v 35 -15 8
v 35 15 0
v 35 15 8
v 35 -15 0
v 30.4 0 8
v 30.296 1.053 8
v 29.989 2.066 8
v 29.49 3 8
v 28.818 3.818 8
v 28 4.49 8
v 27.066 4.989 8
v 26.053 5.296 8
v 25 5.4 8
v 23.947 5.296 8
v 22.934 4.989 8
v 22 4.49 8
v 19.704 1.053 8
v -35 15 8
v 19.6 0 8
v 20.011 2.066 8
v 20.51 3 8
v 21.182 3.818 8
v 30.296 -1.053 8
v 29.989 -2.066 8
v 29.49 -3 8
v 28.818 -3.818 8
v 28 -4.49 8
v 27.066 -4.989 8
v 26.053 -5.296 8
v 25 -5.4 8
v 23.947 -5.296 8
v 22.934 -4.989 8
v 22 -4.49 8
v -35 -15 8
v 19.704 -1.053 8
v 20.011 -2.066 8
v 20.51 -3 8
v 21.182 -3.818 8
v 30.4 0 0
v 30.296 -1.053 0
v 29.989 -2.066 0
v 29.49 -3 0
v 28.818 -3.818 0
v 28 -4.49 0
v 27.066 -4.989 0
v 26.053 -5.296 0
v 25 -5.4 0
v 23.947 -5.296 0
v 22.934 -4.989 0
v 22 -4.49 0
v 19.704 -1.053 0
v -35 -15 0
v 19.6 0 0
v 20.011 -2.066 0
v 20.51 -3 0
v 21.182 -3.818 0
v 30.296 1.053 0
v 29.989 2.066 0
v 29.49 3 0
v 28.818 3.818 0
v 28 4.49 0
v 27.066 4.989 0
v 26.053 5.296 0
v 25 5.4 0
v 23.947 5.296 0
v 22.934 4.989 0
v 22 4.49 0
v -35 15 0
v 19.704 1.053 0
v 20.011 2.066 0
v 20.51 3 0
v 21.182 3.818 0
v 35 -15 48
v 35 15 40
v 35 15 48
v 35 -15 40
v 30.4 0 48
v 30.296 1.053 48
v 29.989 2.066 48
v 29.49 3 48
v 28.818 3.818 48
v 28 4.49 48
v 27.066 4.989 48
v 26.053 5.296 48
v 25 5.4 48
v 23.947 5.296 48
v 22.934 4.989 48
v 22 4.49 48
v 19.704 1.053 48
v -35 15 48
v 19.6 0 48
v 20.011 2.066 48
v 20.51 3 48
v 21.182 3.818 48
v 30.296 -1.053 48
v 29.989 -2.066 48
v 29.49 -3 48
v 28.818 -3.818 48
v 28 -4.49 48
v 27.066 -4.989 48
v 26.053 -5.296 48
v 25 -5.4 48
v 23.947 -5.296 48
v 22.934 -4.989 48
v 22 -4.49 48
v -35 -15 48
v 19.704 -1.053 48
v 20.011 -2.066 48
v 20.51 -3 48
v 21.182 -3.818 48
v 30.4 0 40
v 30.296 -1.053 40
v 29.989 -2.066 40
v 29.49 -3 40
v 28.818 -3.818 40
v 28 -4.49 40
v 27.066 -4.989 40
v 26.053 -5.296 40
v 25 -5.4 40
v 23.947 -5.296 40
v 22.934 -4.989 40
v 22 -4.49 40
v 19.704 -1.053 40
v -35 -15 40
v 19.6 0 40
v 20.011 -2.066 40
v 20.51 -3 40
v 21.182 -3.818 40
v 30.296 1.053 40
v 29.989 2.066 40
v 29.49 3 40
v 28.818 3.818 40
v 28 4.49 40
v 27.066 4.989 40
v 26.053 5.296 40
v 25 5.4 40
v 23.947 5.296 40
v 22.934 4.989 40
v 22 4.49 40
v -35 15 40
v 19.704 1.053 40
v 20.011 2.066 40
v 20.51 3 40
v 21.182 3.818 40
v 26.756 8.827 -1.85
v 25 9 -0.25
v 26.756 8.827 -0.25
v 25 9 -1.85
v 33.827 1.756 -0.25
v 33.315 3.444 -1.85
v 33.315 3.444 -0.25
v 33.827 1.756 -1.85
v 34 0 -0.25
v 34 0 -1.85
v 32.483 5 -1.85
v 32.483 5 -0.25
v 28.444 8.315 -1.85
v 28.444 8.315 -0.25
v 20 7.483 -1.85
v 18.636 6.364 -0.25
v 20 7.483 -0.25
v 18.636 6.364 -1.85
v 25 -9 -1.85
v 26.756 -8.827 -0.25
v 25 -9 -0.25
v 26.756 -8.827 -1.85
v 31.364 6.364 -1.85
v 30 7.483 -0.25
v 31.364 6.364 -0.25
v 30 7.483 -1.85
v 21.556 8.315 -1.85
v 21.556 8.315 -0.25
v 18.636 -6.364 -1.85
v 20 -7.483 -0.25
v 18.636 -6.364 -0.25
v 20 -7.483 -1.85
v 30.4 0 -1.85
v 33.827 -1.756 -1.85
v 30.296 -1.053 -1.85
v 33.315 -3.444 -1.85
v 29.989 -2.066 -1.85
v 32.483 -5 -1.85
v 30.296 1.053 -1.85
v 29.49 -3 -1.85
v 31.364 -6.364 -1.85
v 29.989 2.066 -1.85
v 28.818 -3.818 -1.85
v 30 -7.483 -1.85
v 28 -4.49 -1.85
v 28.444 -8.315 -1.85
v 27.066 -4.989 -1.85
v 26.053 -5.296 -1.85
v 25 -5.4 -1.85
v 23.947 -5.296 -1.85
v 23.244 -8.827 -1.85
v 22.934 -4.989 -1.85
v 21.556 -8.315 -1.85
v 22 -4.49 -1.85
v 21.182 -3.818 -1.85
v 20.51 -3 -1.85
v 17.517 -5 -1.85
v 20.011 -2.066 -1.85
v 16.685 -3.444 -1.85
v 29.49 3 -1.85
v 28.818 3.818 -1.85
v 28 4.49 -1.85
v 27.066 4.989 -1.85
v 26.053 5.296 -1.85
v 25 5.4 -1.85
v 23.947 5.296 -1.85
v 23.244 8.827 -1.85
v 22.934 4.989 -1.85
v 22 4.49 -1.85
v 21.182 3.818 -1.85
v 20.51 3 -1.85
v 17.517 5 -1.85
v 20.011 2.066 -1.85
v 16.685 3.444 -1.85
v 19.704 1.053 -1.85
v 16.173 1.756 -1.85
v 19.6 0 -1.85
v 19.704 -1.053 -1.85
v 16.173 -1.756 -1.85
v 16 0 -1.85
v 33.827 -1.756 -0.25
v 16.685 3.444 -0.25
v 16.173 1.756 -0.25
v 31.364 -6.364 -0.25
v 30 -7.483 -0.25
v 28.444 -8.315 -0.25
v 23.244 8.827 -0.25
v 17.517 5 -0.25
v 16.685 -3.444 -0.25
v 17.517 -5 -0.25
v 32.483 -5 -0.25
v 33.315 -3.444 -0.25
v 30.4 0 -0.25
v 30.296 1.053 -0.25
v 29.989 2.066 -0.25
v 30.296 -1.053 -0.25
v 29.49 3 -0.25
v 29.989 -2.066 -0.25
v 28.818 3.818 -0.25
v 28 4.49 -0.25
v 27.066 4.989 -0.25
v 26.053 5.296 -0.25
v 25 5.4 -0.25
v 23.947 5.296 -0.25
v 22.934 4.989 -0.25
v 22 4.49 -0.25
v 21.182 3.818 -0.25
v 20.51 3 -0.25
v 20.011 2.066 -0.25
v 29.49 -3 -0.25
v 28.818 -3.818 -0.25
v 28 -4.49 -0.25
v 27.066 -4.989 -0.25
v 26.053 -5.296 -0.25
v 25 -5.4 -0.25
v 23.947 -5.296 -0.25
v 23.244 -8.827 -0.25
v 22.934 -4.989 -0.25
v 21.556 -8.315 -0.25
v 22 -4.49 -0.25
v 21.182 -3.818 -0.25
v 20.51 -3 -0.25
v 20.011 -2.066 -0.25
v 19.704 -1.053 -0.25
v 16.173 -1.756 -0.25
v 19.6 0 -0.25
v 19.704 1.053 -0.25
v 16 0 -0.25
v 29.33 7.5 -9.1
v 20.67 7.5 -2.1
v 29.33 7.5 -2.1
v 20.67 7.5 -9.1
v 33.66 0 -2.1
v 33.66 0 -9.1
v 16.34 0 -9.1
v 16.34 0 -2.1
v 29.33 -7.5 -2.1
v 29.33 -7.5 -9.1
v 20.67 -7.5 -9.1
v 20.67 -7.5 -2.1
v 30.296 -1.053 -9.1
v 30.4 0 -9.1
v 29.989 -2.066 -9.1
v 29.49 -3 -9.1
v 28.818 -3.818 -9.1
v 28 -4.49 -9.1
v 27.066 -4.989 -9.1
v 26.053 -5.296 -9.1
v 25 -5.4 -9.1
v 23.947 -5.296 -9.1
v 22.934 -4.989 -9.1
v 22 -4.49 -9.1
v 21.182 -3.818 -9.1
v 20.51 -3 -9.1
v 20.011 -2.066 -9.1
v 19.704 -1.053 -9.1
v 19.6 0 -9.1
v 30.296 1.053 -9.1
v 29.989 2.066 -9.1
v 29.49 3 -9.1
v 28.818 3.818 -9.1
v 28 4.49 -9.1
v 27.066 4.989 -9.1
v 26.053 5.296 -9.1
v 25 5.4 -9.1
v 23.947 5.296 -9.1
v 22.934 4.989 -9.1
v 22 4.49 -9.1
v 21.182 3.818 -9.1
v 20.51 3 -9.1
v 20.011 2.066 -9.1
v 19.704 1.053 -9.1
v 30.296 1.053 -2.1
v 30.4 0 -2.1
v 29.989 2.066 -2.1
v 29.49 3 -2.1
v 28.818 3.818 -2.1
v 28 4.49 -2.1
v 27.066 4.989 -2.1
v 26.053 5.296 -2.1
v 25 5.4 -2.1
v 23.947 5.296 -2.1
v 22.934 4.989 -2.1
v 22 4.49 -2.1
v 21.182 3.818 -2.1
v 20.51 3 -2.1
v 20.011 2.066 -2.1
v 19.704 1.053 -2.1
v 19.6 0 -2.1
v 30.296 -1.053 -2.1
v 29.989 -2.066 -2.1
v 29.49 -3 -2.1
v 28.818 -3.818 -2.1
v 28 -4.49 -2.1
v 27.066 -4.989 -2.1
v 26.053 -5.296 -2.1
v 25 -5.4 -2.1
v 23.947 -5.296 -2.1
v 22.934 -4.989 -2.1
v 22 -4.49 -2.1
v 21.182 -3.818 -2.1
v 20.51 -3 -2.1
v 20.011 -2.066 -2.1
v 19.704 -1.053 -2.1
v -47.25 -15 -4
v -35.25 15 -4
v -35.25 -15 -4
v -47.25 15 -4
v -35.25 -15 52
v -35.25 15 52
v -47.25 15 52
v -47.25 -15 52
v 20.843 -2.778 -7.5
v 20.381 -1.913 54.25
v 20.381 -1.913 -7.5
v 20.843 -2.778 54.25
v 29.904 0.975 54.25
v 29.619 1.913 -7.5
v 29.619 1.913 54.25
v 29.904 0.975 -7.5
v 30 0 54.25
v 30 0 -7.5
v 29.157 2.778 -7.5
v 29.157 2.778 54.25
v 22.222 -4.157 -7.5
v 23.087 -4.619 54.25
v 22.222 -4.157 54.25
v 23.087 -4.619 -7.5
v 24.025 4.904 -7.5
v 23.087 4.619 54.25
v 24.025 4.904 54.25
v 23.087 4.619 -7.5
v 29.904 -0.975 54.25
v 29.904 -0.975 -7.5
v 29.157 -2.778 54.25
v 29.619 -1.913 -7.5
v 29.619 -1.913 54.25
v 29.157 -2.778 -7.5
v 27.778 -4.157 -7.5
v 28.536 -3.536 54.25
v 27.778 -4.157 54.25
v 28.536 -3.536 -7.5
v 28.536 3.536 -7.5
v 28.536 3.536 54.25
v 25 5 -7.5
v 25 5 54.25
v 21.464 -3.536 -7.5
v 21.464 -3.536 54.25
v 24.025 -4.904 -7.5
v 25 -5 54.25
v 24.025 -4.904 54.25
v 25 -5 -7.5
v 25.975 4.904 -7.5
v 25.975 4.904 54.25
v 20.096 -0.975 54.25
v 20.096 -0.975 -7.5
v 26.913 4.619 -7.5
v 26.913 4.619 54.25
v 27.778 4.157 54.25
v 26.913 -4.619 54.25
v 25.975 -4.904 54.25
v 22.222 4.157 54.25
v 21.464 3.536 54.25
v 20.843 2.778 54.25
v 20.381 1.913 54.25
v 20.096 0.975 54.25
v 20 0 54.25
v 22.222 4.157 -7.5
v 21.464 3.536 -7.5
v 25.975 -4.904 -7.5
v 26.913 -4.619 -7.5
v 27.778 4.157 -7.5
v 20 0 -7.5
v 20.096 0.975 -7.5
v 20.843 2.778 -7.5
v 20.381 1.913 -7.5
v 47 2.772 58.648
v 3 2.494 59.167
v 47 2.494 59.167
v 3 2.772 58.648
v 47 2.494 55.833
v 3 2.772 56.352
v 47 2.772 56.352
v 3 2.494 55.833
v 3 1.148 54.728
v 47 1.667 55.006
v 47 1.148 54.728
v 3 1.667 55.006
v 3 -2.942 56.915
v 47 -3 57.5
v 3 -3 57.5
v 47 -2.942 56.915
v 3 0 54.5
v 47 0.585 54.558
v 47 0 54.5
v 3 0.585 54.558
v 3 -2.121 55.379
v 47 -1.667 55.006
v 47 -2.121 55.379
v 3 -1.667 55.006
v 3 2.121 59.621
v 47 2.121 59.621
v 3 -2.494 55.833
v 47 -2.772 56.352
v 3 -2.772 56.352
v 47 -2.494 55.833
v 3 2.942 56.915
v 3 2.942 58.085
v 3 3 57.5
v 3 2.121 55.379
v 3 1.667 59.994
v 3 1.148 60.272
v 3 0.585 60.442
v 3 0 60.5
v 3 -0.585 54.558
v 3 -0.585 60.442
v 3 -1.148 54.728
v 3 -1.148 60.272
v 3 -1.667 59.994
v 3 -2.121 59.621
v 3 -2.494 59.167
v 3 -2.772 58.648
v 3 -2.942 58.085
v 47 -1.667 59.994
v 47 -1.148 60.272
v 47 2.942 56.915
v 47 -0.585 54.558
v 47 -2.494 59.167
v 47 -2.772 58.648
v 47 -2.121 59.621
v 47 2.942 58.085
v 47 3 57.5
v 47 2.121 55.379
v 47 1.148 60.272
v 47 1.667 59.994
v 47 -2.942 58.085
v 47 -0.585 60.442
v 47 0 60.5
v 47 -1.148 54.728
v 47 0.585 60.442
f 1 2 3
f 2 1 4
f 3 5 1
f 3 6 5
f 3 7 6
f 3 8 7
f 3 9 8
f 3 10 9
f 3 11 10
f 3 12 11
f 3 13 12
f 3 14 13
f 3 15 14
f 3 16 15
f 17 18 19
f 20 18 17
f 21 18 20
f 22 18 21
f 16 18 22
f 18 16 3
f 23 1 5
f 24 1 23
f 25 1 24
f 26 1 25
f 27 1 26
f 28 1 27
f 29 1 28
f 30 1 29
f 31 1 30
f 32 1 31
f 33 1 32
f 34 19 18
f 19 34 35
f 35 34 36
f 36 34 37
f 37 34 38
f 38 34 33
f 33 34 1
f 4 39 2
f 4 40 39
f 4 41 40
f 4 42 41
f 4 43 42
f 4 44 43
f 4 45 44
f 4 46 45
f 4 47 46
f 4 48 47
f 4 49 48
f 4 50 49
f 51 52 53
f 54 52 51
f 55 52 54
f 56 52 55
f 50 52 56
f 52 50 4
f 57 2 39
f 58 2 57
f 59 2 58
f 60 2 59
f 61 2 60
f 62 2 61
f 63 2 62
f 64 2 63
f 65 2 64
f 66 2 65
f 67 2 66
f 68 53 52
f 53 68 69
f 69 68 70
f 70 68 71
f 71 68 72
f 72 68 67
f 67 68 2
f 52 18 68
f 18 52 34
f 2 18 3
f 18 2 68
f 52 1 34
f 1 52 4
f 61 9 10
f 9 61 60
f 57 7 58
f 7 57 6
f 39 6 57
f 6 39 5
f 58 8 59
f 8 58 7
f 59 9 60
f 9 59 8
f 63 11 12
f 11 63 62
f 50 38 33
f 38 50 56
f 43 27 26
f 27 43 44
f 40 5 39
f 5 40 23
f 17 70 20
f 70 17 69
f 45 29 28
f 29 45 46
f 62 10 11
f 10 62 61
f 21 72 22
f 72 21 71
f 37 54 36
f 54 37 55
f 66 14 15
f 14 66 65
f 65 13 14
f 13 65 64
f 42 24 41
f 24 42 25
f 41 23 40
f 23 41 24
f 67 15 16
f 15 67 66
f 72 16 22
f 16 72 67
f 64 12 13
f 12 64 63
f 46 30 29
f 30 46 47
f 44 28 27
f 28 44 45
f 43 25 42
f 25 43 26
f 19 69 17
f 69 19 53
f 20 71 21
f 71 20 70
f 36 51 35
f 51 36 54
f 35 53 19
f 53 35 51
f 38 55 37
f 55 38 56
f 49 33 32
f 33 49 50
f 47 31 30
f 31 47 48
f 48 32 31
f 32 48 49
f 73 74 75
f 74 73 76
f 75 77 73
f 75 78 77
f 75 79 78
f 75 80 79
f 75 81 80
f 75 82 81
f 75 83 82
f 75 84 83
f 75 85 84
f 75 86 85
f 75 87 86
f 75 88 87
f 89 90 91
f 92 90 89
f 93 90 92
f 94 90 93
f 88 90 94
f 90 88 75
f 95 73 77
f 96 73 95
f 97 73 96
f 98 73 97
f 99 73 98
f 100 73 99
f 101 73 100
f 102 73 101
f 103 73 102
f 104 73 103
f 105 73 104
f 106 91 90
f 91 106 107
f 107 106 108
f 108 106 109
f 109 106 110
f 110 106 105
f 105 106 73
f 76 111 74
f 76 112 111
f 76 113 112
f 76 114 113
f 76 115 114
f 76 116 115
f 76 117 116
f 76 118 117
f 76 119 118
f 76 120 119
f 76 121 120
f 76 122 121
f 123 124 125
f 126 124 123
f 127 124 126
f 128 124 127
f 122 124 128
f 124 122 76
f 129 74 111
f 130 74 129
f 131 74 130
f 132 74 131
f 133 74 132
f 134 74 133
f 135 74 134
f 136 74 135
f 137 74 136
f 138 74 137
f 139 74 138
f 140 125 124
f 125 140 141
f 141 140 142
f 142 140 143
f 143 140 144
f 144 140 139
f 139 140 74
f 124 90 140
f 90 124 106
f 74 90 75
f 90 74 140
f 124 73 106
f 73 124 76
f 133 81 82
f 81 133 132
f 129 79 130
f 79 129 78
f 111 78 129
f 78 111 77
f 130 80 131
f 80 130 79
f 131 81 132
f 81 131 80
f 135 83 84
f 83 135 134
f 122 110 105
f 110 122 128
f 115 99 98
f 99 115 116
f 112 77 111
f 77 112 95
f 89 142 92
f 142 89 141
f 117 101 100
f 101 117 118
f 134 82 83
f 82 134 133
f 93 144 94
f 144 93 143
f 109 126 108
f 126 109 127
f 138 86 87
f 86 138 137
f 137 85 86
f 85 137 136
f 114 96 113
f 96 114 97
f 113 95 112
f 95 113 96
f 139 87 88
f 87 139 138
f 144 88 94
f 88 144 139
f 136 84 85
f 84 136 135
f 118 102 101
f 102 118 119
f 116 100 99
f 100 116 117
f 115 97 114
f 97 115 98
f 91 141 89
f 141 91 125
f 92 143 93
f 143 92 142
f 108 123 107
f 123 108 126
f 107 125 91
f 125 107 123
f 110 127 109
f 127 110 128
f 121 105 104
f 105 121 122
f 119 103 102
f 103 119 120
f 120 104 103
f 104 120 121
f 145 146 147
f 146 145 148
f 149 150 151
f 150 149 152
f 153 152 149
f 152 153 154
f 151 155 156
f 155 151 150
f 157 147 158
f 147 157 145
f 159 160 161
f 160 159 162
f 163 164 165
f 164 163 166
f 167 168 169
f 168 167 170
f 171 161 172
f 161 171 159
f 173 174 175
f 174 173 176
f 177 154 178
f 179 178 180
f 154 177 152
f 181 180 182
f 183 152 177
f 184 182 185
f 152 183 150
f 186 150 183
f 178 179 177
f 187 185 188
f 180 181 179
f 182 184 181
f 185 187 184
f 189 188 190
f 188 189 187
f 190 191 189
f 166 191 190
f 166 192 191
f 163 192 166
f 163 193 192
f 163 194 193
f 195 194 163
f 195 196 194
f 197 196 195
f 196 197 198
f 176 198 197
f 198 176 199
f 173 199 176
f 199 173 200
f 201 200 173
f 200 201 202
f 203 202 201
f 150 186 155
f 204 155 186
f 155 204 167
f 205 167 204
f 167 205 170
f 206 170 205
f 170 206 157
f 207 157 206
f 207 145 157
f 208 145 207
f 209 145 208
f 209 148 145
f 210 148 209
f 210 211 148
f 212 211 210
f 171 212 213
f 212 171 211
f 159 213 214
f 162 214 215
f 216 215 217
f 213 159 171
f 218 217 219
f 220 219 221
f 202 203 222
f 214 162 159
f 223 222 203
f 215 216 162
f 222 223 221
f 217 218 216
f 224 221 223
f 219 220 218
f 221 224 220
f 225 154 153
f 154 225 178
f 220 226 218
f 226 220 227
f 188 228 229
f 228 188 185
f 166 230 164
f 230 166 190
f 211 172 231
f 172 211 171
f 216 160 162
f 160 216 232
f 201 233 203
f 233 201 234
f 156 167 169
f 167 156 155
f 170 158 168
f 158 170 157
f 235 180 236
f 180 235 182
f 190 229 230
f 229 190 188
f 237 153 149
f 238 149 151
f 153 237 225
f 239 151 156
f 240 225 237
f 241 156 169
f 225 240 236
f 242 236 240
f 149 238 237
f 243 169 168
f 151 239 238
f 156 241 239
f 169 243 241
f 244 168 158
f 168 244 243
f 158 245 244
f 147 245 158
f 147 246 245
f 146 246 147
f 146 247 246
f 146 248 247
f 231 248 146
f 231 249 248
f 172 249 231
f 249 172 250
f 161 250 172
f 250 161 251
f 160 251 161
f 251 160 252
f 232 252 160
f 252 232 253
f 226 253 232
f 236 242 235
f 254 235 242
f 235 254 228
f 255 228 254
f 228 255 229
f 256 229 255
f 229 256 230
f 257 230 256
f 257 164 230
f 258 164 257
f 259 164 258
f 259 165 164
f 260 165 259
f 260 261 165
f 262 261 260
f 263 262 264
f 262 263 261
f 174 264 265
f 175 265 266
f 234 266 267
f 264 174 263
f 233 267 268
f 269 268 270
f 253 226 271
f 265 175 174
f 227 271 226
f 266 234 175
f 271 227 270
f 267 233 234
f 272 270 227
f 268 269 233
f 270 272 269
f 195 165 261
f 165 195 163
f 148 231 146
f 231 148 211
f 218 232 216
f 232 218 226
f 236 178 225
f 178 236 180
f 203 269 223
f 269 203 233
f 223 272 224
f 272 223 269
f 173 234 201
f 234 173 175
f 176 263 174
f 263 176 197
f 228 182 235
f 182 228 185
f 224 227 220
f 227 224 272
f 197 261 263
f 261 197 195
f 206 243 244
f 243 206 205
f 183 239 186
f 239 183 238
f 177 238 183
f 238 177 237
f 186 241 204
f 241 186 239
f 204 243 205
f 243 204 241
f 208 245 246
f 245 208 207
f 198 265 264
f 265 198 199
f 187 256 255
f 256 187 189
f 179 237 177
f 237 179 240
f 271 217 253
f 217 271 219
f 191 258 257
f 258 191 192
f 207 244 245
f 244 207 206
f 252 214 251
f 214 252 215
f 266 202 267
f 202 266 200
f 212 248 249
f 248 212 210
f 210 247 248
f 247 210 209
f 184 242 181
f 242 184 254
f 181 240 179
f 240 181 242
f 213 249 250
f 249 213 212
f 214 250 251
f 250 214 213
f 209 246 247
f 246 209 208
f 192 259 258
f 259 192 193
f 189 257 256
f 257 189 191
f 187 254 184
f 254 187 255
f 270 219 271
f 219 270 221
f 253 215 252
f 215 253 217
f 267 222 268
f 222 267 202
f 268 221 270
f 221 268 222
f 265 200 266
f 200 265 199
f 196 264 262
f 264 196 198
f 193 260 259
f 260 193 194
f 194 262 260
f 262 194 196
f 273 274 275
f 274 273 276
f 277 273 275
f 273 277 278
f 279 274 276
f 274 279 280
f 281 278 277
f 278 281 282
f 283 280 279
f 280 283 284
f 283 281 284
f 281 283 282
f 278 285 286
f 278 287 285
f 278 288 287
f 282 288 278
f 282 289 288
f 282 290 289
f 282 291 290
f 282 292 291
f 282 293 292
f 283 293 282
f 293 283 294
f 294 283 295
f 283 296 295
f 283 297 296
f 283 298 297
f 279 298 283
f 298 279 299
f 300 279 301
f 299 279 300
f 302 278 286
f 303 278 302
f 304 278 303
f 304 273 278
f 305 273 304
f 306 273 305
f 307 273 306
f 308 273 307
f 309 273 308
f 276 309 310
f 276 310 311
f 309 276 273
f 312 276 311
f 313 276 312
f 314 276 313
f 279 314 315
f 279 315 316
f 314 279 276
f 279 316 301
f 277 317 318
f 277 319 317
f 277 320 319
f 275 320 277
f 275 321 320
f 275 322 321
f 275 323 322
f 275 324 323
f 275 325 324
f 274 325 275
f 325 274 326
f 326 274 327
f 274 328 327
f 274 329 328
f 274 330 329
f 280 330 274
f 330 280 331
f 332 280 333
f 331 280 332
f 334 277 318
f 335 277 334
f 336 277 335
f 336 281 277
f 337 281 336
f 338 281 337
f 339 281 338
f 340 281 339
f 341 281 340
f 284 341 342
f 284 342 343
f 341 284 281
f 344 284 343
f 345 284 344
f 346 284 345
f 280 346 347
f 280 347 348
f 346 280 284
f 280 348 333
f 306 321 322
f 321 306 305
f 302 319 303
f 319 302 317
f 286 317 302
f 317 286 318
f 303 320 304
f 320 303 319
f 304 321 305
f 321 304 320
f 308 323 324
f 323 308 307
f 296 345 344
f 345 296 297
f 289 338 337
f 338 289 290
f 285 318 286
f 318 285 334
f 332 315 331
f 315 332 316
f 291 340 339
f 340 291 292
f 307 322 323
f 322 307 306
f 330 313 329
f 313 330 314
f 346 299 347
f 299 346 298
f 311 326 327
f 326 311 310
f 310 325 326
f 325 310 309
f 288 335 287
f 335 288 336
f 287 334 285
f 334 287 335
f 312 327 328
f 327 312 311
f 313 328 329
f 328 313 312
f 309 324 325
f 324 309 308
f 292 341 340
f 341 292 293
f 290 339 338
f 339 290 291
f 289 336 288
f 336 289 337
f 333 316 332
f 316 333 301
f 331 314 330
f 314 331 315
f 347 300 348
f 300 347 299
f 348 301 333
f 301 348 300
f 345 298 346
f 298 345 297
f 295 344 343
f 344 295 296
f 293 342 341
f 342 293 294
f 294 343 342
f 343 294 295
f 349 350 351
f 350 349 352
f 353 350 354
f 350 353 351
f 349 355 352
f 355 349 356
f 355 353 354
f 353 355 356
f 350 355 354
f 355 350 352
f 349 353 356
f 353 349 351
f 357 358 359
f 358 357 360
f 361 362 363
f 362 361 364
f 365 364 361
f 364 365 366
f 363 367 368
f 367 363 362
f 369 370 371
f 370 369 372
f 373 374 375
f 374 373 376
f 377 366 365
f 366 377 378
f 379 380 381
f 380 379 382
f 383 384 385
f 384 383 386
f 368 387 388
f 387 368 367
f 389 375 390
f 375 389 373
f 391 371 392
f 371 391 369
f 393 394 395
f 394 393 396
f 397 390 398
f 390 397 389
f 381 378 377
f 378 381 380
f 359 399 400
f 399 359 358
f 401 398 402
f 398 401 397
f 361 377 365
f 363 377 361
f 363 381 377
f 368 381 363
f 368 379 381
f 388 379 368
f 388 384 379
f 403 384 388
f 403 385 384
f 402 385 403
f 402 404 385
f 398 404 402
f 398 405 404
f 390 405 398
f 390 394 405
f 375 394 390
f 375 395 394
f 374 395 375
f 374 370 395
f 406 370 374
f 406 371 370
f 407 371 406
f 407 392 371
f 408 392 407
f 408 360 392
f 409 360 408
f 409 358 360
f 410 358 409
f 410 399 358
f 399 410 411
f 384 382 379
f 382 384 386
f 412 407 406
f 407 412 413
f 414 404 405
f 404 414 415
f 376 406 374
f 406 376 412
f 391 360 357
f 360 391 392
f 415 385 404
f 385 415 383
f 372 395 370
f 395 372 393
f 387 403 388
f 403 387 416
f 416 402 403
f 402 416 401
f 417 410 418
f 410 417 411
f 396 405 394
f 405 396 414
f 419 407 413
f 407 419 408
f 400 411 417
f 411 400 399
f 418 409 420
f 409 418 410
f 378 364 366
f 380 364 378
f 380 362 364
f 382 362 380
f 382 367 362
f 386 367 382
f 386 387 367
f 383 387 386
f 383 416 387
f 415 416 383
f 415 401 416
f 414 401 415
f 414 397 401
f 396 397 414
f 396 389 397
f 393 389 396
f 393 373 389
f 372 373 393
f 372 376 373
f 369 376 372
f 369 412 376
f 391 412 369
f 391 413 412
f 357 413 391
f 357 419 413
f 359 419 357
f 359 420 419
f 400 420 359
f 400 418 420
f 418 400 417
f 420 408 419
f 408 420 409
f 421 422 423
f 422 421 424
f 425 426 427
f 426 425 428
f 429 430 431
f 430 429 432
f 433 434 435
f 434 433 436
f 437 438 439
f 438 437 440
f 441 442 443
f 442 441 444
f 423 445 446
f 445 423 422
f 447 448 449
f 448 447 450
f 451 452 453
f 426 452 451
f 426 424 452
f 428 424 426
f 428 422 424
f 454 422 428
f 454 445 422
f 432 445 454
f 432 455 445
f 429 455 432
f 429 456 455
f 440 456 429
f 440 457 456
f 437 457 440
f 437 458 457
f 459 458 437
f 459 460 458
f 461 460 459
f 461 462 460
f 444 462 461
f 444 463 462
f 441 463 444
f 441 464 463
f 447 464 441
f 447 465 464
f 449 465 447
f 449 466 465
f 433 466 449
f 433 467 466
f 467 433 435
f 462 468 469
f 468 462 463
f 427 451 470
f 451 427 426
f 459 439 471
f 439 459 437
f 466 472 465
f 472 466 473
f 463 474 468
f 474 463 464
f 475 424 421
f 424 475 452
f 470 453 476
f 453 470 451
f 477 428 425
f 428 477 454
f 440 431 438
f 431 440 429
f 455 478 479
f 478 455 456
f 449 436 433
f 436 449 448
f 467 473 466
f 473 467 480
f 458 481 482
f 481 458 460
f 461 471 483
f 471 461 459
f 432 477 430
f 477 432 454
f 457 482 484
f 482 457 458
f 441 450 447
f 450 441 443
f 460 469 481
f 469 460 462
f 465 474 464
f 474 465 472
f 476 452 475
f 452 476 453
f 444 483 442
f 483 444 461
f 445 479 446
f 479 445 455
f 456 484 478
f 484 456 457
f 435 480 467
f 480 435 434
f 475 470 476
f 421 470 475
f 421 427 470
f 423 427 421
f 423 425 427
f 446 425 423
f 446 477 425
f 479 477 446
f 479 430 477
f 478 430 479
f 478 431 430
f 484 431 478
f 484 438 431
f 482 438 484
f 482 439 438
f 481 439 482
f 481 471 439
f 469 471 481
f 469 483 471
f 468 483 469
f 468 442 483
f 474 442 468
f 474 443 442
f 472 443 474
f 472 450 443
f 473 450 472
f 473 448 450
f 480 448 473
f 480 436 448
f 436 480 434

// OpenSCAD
$fn = 32;

// ------------------------------------------------------------------------
// C clamp: throat 40 mm, screw d10
// Every part is its own module, assembly() places every instance.
// ------------------------------------------------------------------------

// --- part 1 ---
module clamp_arm() {
  difference() {
    translate([-35, -15, 0]) cube([70, 30, 8]);
    translate([25, 0, -1]) cylinder(h = 10, d = 10.8);
  }
}

// --- part 2 ---
module clamp_spine() {
  difference() {
    translate([-28, -15, 0]) cube([56, 30, 12]);
  }
}

// --- part 3 ---
module clamp_screw() {
  translate([0, 0, -30.875]) cylinder(h = 61.75, d = 10);
}

// --- part 4 ---
module clamp_washer() {
  difference() {
      translate([0, 0, 0]) cylinder(h = 1.6, d = 18);
      translate([0, 0, -1]) cylinder(h = 3.6, d = 10.8);
    }
}

// --- part 5 ---
module clamp_nut() {
  difference() {
    linear_extrude(height = 7) polygon(points = [[8.66, 0], [4.33, 7.5], [-4.33, 7.5], [-8.66, 0], [-4.33, -7.5], [4.33, -7.5]]);
    translate([0, 0, -1]) cylinder(h = 9, d = 10.8);
  }
}

// --- part 6 ---
module tommy_bar() {
  translate([0, 0, -22]) cylinder(h = 44, d = 6);
}

// --- assembly ---
module assembly() {
  color([0.80, 0.24, 0.20]) translate([0, 0, 0]) rotate([0, 0, 0]) clamp_arm();
  color([0.20, 0.45, 0.75]) translate([0, 0, 40]) rotate([0, 0, 0]) clamp_arm();
  color([0.25, 0.62, 0.32]) translate([-47.25, 0, 24]) rotate([0, 90, 0]) clamp_spine();
  color([0.92, 0.70, 0.18]) translate([25, 0, 23.375]) rotate([0, 0, 0]) clamp_screw();
  color([0.58, 0.35, 0.70]) translate([25, 0, -1.85]) rotate([0, 0, 0]) clamp_washer();
  color([0.16, 0.66, 0.66]) translate([25, 0, -9.1]) rotate([0, 0, 0]) clamp_nut();
  color([0.85, 0.48, 0.18]) translate([25, 0, 57.5]) rotate([0, 90, 0]) tommy_bar();
}

assembly();
